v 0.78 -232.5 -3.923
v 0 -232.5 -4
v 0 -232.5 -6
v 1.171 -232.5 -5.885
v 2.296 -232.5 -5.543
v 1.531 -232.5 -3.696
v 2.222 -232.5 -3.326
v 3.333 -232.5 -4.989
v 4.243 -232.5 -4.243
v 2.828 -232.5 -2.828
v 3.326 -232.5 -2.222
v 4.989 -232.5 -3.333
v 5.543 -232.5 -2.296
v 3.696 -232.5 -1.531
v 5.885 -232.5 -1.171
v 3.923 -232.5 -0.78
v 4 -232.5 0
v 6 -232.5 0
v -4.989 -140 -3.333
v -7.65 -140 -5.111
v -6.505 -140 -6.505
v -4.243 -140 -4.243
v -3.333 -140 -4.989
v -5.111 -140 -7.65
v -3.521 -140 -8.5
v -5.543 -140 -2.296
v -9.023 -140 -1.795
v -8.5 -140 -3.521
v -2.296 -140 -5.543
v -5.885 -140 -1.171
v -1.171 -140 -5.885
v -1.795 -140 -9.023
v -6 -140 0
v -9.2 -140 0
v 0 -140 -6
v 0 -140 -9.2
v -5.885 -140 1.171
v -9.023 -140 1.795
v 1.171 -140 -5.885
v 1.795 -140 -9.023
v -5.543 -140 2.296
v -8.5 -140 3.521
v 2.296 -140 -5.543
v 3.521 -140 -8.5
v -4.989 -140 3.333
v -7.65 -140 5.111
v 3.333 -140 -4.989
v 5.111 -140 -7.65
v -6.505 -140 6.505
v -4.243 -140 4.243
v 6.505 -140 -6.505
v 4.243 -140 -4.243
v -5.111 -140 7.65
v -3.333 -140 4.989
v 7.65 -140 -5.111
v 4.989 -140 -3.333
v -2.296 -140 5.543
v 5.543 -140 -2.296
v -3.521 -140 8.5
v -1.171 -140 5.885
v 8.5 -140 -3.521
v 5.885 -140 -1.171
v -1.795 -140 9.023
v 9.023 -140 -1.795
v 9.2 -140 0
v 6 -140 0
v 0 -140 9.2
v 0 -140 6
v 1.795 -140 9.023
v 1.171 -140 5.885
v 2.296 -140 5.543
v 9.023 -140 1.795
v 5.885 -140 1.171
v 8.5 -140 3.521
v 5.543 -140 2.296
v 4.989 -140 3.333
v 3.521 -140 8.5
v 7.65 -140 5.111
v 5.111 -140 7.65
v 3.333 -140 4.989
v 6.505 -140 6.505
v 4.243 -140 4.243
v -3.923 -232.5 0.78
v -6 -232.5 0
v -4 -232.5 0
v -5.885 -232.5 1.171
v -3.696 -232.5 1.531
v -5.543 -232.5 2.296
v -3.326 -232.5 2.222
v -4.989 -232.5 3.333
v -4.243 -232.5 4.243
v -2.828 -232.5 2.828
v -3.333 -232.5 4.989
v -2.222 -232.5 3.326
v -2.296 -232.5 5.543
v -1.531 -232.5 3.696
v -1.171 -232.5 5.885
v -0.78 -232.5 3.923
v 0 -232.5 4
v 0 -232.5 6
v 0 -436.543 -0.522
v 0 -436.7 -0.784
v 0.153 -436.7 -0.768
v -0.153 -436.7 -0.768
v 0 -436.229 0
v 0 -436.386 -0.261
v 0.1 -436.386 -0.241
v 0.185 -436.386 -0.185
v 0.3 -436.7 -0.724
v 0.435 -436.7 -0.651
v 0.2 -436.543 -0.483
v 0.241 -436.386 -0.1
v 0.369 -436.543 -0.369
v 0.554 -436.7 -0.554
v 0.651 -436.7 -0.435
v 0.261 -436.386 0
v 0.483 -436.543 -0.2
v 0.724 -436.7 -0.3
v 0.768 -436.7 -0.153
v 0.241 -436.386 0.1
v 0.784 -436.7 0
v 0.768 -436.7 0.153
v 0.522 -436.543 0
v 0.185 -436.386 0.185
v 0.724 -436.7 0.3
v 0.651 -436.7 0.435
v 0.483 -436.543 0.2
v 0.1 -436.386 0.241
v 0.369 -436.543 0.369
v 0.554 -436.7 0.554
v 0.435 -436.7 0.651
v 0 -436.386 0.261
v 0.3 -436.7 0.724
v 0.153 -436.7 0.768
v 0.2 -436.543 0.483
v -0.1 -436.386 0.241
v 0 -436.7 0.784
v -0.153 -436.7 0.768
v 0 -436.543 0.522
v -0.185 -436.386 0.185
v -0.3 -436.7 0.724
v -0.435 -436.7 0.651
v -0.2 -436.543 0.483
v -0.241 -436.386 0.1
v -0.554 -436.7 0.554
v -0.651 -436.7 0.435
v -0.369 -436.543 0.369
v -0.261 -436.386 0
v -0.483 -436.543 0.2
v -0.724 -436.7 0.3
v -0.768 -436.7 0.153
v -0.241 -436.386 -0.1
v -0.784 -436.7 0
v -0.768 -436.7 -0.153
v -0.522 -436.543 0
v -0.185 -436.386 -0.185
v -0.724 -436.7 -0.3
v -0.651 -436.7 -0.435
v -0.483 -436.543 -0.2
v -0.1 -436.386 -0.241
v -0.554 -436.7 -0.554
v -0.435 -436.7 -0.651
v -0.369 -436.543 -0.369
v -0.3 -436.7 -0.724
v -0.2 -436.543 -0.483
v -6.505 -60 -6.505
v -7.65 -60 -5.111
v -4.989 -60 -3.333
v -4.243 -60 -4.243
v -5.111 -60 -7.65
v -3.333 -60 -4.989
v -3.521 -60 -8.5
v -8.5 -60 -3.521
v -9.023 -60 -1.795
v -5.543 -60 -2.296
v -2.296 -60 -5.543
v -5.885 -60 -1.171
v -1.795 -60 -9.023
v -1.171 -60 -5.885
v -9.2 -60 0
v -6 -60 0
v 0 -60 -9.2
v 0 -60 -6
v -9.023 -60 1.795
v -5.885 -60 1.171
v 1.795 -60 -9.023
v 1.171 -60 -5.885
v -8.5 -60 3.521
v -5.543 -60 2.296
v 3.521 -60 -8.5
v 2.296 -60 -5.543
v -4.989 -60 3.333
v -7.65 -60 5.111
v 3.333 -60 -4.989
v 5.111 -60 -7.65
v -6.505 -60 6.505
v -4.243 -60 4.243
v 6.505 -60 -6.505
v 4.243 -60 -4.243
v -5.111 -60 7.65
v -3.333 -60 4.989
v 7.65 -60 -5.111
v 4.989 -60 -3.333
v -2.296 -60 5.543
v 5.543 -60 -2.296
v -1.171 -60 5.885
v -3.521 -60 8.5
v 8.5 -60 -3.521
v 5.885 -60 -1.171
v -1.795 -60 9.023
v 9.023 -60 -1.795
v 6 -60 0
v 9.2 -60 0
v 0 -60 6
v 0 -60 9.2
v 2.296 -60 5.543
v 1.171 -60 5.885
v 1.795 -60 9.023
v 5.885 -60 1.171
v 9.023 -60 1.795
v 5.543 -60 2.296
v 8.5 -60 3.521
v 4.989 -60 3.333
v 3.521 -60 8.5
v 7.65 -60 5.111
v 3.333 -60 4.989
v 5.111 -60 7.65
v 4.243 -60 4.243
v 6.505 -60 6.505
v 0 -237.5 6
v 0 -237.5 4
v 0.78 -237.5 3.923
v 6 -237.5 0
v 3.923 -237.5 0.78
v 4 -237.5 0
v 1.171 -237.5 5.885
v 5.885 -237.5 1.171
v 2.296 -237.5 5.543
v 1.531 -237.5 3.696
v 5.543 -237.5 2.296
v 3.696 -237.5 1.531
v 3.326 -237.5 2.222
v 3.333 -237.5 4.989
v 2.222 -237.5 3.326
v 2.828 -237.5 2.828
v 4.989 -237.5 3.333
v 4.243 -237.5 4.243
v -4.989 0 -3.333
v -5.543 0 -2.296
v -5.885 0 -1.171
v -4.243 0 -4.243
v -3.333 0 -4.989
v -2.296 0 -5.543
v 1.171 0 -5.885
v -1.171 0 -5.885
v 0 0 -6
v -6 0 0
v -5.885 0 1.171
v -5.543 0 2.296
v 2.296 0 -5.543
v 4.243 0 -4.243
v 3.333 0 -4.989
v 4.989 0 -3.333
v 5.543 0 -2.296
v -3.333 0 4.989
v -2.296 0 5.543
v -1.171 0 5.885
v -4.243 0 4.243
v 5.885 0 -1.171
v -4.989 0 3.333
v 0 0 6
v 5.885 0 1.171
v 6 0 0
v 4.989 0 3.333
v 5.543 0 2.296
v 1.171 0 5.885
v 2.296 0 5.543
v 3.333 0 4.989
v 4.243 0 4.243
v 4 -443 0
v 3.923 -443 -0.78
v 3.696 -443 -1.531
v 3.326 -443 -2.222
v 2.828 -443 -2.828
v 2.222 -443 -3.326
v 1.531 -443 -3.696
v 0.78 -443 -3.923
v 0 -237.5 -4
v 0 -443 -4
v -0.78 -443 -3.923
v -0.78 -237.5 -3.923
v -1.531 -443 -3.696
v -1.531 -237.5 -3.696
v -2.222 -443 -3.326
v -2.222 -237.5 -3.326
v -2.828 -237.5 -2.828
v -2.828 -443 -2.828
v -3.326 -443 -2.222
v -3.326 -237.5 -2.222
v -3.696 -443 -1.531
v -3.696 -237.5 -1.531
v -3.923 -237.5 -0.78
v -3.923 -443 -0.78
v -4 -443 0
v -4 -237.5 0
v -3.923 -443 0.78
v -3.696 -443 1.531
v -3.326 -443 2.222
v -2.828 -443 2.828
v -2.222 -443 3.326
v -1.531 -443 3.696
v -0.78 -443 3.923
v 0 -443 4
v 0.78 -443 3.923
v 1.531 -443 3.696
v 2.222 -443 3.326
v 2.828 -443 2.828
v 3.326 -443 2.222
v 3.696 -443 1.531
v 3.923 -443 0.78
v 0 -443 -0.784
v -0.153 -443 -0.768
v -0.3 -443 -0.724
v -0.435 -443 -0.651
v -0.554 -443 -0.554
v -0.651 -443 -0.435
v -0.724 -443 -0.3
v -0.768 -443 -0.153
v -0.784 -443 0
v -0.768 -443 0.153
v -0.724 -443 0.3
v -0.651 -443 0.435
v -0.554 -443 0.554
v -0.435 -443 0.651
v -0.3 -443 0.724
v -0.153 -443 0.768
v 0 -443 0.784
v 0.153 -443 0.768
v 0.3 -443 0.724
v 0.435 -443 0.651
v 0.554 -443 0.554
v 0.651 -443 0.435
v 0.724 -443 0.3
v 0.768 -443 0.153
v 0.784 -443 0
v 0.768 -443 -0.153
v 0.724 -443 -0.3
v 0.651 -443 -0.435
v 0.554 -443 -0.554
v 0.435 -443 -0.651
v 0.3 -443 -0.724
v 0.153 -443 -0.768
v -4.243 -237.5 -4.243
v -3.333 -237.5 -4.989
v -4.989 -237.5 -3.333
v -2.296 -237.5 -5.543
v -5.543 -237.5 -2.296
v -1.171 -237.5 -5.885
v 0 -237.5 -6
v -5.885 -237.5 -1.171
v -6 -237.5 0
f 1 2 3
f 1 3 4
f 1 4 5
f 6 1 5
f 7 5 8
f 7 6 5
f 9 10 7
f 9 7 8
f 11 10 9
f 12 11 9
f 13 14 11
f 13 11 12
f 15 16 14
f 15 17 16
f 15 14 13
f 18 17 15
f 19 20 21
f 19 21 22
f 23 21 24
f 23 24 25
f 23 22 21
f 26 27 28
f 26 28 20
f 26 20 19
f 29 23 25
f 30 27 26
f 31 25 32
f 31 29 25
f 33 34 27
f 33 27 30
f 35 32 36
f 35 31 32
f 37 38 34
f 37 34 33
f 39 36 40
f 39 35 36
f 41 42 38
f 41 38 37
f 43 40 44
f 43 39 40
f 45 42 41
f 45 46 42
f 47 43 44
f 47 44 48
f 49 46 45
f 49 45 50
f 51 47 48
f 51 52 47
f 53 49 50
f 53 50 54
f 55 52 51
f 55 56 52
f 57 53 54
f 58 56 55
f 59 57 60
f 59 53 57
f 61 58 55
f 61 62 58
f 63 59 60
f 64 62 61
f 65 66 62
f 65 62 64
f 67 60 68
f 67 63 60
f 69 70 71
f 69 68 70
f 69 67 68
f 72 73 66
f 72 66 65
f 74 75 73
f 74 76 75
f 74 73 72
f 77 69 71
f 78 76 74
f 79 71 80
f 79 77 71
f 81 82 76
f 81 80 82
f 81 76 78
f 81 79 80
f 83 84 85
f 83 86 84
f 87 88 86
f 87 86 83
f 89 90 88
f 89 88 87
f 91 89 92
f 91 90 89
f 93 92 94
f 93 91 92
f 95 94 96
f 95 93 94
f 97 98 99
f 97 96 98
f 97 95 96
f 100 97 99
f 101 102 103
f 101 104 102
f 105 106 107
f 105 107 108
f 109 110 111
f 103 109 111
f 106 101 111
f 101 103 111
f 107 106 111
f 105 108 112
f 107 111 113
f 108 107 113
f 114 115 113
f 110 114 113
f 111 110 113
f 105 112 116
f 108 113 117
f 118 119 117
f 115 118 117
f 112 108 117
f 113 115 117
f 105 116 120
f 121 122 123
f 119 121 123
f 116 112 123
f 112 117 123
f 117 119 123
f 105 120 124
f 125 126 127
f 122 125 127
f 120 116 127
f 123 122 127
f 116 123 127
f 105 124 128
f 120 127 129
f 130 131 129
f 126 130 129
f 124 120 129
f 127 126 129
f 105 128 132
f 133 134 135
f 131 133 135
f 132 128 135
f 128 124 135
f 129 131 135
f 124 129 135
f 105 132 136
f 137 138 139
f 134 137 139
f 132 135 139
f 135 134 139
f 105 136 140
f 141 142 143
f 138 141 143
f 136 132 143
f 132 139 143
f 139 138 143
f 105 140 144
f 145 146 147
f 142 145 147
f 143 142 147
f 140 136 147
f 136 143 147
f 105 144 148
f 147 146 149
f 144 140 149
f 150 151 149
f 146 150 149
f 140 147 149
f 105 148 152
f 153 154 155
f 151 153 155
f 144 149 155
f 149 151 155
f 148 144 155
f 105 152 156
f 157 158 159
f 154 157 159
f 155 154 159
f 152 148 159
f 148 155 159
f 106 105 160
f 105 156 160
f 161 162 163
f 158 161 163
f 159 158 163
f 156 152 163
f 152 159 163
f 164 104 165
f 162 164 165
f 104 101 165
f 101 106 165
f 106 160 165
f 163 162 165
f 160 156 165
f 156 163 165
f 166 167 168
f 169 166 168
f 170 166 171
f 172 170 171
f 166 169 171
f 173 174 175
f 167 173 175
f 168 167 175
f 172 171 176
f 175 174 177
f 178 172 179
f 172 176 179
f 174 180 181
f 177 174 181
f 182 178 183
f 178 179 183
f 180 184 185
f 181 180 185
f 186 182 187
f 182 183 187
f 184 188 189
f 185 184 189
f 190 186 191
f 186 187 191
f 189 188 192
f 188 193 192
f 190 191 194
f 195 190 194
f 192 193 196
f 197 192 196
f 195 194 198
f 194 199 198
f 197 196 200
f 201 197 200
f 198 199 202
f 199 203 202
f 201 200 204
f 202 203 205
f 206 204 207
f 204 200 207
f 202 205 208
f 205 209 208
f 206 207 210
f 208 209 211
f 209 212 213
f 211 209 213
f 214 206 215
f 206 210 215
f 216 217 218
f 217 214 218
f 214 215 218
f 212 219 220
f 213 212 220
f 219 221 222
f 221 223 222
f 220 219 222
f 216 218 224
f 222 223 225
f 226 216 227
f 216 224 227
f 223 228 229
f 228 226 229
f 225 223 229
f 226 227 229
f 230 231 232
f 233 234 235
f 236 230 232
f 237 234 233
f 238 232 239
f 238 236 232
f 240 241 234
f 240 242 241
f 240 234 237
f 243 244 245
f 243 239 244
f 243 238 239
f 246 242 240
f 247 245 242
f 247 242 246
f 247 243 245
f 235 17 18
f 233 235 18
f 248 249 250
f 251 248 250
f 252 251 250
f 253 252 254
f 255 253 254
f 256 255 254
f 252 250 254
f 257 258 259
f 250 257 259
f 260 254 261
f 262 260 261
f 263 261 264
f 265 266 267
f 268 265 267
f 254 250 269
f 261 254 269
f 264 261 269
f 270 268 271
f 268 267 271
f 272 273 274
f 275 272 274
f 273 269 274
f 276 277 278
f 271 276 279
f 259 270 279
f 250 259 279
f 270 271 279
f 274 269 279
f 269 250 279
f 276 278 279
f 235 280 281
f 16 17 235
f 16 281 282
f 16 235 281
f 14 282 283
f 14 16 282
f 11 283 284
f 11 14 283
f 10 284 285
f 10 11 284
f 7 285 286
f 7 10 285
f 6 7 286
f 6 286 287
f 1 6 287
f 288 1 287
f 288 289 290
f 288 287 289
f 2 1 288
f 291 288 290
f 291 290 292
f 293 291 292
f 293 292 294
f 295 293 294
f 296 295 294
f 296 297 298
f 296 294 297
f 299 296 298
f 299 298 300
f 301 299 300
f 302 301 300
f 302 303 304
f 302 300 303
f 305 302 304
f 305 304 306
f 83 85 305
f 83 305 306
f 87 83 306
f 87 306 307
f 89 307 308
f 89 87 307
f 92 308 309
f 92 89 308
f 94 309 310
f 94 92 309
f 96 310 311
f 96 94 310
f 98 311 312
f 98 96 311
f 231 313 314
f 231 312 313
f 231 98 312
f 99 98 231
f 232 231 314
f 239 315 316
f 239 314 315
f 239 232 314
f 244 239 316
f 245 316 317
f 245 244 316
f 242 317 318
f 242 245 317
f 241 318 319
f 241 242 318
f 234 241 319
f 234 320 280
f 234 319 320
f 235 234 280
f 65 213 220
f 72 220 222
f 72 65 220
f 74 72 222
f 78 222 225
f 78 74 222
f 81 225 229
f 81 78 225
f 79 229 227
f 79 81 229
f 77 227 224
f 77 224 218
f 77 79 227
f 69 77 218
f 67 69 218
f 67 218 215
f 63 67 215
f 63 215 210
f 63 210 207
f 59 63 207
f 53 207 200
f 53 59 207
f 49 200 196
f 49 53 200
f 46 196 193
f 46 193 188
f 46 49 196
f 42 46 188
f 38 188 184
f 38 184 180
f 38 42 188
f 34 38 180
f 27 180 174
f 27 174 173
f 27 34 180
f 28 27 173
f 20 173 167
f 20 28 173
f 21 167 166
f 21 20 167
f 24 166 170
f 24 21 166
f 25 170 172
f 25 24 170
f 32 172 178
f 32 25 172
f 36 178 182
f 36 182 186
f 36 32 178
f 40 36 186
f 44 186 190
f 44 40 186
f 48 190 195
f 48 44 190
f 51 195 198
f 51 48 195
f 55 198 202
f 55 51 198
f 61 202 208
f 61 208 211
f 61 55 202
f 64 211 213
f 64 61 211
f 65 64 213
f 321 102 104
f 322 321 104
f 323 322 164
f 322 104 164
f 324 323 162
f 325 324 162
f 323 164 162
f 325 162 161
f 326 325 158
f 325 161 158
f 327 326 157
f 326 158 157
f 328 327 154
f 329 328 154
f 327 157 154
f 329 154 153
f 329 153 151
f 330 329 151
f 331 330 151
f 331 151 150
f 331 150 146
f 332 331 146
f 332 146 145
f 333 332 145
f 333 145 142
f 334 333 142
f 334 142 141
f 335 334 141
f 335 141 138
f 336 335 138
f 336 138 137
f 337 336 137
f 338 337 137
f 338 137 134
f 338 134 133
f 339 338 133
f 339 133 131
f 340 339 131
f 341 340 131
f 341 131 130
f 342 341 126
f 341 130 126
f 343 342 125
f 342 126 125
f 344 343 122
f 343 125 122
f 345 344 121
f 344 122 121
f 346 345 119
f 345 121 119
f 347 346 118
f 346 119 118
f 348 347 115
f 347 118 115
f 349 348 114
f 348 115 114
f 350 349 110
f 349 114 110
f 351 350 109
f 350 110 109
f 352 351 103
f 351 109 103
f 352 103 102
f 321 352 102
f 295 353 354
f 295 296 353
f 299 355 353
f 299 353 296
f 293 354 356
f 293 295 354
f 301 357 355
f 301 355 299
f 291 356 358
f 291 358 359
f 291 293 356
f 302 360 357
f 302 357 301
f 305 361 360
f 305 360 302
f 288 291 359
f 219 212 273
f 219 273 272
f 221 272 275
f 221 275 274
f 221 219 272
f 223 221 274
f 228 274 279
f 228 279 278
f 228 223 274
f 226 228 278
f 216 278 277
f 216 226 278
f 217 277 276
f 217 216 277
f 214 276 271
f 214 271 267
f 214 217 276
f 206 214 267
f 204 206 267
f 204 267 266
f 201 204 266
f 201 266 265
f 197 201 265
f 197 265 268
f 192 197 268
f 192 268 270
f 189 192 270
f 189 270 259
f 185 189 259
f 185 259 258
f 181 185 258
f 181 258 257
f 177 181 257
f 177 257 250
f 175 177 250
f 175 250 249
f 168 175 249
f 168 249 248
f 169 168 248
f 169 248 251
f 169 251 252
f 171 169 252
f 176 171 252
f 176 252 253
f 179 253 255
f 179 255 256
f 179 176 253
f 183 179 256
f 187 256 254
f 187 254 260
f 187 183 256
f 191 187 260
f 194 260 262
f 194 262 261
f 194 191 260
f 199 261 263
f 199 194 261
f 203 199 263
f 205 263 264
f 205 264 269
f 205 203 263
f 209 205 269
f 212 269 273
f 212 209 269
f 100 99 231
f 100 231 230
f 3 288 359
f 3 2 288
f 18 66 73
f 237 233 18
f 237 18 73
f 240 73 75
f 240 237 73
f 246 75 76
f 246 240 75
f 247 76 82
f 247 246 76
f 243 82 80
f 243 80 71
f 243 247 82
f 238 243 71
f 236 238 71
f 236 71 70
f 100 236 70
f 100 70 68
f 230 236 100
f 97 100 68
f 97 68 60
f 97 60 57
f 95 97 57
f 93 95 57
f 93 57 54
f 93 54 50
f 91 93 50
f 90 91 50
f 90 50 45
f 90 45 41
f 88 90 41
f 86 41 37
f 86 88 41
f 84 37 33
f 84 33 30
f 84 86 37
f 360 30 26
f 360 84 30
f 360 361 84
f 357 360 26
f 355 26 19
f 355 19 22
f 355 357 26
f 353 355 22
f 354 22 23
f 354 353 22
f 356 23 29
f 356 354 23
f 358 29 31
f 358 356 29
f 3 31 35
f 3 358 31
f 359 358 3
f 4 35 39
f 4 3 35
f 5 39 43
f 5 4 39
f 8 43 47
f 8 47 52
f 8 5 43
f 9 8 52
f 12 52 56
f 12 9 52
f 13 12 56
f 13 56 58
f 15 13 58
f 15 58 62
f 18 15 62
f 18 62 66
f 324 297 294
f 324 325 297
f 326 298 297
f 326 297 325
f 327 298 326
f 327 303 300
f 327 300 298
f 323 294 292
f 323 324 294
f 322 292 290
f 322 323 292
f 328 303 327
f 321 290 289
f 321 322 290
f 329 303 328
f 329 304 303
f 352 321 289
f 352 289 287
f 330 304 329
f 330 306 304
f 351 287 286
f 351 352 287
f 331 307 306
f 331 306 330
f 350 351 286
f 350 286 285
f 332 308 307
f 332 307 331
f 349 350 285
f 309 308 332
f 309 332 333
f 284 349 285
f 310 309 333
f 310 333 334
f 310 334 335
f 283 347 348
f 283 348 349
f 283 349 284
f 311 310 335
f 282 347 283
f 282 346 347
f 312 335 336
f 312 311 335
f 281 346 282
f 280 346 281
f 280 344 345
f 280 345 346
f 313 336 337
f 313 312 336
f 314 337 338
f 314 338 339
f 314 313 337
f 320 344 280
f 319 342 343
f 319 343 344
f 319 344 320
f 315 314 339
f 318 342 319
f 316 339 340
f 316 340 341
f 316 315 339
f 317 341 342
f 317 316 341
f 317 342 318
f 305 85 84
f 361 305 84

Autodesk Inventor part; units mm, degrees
ref_plane "YZ Plane" through (0, 0, 0) normal (1, 0, 0) x (0, 1, 0)
ref_plane "XZ Plane" through (0, 0, 0) normal (0, 1, 0) x (-1, 0, 0)
ref_plane "XY Plane" through (0, 0, 0) normal (0, 0, 1) x (1, 0, 0)
sketch "Sketch1" plane through (0, 0, 0) normal (0, 0, 1) x (1, 0, 0)
  line L0 (0, 0) -> (0, -500) construction
  line L1 (0, 0) -> (6, 0)
  line L2 (6, 0) -> (6, -60)
  line L3 (6, -60) -> (9.2, -60)
  line L4 (9.2, -60) -> (9.2, -140)
  line L5 (9.2, -140) -> (6, -140)
  line L6 (6, -140) -> (6, -232.5)
  line L7 (0, 0) -> (0, -443)
  line L8 (0, 0) -> (0, 9) construction
  line L9 (4, -443) -> (4, -232.5)
  line L10 (4, -232.5) -> (6, -232.5)
  line L11 (4, -443) -> (0, -443)
  dimension "d1" = 12
  dimension "d2" = 60
  dimension "d3" = 18.4
  dimension "d4" = 80
  dimension "d7" = 8
  dimension "d8" = 210.5
  dimension "d9" = 443
revolve "Revolution1" add sketch "Sketch1" angle 360 about axis through (0, 0, 0) along (0, -1, 0)
sketch "Sketch2" plane through (0, -232.5, 0) normal (0, -1, 0) x (1, 0, 0)
  line L0 (0, 0) -> (0, 10.7217) construction
  line L1 (0, 0) -> (0, -10) construction
  line L2 (0, 0) -> (-12.4689, 0) construction
  line L3 (0, 0) -> (11.6918, 0) construction
  circle A0 centre (0, 0) radius 6 construction
  arc A1 (6, 0) -> (0, 6) centre (0, 0) ccw
  arc A2 (-6, 0) -> (0, -6) centre (0, 0) ccw
  arc A3 (4, 0) -> (0, 4) centre (0, 0) ccw
  arc A4 (-4, 0) -> (0, -4) centre (0, 0) ccw
  line L4 (-4, 0) -> (-6, 0)
  line L5 (0, -4) -> (0, -6)
  line L6 (0, 4) -> (0, 6)
  line L7 (4, 0) -> (6, 0)
  dimension "d10" = 4
  dimension "d11" = 4
extrude "Extrusion1" add sketch "Sketch2" along normal blind 5
sketch "Sketch3" plane through (0, -443, 0) normal (0, -1, 0) x (1, 0, 0)
  point P0 (0, 0)
  point P1 (0, 0)
hole "Hole1" at (0, -443, 0) direction (0, 1, 0) diameter 1.567 depth 6.3 tip angle 118 thread size "M2x0.4" class "6H" standard "ANSI Metric M Profile"
sketch "Sketch4" plane through (0, -443, 0) normal (0, -1, 0) x (1, 0, 0)
  point P0 (0, 0)
properties part number "Achse"
